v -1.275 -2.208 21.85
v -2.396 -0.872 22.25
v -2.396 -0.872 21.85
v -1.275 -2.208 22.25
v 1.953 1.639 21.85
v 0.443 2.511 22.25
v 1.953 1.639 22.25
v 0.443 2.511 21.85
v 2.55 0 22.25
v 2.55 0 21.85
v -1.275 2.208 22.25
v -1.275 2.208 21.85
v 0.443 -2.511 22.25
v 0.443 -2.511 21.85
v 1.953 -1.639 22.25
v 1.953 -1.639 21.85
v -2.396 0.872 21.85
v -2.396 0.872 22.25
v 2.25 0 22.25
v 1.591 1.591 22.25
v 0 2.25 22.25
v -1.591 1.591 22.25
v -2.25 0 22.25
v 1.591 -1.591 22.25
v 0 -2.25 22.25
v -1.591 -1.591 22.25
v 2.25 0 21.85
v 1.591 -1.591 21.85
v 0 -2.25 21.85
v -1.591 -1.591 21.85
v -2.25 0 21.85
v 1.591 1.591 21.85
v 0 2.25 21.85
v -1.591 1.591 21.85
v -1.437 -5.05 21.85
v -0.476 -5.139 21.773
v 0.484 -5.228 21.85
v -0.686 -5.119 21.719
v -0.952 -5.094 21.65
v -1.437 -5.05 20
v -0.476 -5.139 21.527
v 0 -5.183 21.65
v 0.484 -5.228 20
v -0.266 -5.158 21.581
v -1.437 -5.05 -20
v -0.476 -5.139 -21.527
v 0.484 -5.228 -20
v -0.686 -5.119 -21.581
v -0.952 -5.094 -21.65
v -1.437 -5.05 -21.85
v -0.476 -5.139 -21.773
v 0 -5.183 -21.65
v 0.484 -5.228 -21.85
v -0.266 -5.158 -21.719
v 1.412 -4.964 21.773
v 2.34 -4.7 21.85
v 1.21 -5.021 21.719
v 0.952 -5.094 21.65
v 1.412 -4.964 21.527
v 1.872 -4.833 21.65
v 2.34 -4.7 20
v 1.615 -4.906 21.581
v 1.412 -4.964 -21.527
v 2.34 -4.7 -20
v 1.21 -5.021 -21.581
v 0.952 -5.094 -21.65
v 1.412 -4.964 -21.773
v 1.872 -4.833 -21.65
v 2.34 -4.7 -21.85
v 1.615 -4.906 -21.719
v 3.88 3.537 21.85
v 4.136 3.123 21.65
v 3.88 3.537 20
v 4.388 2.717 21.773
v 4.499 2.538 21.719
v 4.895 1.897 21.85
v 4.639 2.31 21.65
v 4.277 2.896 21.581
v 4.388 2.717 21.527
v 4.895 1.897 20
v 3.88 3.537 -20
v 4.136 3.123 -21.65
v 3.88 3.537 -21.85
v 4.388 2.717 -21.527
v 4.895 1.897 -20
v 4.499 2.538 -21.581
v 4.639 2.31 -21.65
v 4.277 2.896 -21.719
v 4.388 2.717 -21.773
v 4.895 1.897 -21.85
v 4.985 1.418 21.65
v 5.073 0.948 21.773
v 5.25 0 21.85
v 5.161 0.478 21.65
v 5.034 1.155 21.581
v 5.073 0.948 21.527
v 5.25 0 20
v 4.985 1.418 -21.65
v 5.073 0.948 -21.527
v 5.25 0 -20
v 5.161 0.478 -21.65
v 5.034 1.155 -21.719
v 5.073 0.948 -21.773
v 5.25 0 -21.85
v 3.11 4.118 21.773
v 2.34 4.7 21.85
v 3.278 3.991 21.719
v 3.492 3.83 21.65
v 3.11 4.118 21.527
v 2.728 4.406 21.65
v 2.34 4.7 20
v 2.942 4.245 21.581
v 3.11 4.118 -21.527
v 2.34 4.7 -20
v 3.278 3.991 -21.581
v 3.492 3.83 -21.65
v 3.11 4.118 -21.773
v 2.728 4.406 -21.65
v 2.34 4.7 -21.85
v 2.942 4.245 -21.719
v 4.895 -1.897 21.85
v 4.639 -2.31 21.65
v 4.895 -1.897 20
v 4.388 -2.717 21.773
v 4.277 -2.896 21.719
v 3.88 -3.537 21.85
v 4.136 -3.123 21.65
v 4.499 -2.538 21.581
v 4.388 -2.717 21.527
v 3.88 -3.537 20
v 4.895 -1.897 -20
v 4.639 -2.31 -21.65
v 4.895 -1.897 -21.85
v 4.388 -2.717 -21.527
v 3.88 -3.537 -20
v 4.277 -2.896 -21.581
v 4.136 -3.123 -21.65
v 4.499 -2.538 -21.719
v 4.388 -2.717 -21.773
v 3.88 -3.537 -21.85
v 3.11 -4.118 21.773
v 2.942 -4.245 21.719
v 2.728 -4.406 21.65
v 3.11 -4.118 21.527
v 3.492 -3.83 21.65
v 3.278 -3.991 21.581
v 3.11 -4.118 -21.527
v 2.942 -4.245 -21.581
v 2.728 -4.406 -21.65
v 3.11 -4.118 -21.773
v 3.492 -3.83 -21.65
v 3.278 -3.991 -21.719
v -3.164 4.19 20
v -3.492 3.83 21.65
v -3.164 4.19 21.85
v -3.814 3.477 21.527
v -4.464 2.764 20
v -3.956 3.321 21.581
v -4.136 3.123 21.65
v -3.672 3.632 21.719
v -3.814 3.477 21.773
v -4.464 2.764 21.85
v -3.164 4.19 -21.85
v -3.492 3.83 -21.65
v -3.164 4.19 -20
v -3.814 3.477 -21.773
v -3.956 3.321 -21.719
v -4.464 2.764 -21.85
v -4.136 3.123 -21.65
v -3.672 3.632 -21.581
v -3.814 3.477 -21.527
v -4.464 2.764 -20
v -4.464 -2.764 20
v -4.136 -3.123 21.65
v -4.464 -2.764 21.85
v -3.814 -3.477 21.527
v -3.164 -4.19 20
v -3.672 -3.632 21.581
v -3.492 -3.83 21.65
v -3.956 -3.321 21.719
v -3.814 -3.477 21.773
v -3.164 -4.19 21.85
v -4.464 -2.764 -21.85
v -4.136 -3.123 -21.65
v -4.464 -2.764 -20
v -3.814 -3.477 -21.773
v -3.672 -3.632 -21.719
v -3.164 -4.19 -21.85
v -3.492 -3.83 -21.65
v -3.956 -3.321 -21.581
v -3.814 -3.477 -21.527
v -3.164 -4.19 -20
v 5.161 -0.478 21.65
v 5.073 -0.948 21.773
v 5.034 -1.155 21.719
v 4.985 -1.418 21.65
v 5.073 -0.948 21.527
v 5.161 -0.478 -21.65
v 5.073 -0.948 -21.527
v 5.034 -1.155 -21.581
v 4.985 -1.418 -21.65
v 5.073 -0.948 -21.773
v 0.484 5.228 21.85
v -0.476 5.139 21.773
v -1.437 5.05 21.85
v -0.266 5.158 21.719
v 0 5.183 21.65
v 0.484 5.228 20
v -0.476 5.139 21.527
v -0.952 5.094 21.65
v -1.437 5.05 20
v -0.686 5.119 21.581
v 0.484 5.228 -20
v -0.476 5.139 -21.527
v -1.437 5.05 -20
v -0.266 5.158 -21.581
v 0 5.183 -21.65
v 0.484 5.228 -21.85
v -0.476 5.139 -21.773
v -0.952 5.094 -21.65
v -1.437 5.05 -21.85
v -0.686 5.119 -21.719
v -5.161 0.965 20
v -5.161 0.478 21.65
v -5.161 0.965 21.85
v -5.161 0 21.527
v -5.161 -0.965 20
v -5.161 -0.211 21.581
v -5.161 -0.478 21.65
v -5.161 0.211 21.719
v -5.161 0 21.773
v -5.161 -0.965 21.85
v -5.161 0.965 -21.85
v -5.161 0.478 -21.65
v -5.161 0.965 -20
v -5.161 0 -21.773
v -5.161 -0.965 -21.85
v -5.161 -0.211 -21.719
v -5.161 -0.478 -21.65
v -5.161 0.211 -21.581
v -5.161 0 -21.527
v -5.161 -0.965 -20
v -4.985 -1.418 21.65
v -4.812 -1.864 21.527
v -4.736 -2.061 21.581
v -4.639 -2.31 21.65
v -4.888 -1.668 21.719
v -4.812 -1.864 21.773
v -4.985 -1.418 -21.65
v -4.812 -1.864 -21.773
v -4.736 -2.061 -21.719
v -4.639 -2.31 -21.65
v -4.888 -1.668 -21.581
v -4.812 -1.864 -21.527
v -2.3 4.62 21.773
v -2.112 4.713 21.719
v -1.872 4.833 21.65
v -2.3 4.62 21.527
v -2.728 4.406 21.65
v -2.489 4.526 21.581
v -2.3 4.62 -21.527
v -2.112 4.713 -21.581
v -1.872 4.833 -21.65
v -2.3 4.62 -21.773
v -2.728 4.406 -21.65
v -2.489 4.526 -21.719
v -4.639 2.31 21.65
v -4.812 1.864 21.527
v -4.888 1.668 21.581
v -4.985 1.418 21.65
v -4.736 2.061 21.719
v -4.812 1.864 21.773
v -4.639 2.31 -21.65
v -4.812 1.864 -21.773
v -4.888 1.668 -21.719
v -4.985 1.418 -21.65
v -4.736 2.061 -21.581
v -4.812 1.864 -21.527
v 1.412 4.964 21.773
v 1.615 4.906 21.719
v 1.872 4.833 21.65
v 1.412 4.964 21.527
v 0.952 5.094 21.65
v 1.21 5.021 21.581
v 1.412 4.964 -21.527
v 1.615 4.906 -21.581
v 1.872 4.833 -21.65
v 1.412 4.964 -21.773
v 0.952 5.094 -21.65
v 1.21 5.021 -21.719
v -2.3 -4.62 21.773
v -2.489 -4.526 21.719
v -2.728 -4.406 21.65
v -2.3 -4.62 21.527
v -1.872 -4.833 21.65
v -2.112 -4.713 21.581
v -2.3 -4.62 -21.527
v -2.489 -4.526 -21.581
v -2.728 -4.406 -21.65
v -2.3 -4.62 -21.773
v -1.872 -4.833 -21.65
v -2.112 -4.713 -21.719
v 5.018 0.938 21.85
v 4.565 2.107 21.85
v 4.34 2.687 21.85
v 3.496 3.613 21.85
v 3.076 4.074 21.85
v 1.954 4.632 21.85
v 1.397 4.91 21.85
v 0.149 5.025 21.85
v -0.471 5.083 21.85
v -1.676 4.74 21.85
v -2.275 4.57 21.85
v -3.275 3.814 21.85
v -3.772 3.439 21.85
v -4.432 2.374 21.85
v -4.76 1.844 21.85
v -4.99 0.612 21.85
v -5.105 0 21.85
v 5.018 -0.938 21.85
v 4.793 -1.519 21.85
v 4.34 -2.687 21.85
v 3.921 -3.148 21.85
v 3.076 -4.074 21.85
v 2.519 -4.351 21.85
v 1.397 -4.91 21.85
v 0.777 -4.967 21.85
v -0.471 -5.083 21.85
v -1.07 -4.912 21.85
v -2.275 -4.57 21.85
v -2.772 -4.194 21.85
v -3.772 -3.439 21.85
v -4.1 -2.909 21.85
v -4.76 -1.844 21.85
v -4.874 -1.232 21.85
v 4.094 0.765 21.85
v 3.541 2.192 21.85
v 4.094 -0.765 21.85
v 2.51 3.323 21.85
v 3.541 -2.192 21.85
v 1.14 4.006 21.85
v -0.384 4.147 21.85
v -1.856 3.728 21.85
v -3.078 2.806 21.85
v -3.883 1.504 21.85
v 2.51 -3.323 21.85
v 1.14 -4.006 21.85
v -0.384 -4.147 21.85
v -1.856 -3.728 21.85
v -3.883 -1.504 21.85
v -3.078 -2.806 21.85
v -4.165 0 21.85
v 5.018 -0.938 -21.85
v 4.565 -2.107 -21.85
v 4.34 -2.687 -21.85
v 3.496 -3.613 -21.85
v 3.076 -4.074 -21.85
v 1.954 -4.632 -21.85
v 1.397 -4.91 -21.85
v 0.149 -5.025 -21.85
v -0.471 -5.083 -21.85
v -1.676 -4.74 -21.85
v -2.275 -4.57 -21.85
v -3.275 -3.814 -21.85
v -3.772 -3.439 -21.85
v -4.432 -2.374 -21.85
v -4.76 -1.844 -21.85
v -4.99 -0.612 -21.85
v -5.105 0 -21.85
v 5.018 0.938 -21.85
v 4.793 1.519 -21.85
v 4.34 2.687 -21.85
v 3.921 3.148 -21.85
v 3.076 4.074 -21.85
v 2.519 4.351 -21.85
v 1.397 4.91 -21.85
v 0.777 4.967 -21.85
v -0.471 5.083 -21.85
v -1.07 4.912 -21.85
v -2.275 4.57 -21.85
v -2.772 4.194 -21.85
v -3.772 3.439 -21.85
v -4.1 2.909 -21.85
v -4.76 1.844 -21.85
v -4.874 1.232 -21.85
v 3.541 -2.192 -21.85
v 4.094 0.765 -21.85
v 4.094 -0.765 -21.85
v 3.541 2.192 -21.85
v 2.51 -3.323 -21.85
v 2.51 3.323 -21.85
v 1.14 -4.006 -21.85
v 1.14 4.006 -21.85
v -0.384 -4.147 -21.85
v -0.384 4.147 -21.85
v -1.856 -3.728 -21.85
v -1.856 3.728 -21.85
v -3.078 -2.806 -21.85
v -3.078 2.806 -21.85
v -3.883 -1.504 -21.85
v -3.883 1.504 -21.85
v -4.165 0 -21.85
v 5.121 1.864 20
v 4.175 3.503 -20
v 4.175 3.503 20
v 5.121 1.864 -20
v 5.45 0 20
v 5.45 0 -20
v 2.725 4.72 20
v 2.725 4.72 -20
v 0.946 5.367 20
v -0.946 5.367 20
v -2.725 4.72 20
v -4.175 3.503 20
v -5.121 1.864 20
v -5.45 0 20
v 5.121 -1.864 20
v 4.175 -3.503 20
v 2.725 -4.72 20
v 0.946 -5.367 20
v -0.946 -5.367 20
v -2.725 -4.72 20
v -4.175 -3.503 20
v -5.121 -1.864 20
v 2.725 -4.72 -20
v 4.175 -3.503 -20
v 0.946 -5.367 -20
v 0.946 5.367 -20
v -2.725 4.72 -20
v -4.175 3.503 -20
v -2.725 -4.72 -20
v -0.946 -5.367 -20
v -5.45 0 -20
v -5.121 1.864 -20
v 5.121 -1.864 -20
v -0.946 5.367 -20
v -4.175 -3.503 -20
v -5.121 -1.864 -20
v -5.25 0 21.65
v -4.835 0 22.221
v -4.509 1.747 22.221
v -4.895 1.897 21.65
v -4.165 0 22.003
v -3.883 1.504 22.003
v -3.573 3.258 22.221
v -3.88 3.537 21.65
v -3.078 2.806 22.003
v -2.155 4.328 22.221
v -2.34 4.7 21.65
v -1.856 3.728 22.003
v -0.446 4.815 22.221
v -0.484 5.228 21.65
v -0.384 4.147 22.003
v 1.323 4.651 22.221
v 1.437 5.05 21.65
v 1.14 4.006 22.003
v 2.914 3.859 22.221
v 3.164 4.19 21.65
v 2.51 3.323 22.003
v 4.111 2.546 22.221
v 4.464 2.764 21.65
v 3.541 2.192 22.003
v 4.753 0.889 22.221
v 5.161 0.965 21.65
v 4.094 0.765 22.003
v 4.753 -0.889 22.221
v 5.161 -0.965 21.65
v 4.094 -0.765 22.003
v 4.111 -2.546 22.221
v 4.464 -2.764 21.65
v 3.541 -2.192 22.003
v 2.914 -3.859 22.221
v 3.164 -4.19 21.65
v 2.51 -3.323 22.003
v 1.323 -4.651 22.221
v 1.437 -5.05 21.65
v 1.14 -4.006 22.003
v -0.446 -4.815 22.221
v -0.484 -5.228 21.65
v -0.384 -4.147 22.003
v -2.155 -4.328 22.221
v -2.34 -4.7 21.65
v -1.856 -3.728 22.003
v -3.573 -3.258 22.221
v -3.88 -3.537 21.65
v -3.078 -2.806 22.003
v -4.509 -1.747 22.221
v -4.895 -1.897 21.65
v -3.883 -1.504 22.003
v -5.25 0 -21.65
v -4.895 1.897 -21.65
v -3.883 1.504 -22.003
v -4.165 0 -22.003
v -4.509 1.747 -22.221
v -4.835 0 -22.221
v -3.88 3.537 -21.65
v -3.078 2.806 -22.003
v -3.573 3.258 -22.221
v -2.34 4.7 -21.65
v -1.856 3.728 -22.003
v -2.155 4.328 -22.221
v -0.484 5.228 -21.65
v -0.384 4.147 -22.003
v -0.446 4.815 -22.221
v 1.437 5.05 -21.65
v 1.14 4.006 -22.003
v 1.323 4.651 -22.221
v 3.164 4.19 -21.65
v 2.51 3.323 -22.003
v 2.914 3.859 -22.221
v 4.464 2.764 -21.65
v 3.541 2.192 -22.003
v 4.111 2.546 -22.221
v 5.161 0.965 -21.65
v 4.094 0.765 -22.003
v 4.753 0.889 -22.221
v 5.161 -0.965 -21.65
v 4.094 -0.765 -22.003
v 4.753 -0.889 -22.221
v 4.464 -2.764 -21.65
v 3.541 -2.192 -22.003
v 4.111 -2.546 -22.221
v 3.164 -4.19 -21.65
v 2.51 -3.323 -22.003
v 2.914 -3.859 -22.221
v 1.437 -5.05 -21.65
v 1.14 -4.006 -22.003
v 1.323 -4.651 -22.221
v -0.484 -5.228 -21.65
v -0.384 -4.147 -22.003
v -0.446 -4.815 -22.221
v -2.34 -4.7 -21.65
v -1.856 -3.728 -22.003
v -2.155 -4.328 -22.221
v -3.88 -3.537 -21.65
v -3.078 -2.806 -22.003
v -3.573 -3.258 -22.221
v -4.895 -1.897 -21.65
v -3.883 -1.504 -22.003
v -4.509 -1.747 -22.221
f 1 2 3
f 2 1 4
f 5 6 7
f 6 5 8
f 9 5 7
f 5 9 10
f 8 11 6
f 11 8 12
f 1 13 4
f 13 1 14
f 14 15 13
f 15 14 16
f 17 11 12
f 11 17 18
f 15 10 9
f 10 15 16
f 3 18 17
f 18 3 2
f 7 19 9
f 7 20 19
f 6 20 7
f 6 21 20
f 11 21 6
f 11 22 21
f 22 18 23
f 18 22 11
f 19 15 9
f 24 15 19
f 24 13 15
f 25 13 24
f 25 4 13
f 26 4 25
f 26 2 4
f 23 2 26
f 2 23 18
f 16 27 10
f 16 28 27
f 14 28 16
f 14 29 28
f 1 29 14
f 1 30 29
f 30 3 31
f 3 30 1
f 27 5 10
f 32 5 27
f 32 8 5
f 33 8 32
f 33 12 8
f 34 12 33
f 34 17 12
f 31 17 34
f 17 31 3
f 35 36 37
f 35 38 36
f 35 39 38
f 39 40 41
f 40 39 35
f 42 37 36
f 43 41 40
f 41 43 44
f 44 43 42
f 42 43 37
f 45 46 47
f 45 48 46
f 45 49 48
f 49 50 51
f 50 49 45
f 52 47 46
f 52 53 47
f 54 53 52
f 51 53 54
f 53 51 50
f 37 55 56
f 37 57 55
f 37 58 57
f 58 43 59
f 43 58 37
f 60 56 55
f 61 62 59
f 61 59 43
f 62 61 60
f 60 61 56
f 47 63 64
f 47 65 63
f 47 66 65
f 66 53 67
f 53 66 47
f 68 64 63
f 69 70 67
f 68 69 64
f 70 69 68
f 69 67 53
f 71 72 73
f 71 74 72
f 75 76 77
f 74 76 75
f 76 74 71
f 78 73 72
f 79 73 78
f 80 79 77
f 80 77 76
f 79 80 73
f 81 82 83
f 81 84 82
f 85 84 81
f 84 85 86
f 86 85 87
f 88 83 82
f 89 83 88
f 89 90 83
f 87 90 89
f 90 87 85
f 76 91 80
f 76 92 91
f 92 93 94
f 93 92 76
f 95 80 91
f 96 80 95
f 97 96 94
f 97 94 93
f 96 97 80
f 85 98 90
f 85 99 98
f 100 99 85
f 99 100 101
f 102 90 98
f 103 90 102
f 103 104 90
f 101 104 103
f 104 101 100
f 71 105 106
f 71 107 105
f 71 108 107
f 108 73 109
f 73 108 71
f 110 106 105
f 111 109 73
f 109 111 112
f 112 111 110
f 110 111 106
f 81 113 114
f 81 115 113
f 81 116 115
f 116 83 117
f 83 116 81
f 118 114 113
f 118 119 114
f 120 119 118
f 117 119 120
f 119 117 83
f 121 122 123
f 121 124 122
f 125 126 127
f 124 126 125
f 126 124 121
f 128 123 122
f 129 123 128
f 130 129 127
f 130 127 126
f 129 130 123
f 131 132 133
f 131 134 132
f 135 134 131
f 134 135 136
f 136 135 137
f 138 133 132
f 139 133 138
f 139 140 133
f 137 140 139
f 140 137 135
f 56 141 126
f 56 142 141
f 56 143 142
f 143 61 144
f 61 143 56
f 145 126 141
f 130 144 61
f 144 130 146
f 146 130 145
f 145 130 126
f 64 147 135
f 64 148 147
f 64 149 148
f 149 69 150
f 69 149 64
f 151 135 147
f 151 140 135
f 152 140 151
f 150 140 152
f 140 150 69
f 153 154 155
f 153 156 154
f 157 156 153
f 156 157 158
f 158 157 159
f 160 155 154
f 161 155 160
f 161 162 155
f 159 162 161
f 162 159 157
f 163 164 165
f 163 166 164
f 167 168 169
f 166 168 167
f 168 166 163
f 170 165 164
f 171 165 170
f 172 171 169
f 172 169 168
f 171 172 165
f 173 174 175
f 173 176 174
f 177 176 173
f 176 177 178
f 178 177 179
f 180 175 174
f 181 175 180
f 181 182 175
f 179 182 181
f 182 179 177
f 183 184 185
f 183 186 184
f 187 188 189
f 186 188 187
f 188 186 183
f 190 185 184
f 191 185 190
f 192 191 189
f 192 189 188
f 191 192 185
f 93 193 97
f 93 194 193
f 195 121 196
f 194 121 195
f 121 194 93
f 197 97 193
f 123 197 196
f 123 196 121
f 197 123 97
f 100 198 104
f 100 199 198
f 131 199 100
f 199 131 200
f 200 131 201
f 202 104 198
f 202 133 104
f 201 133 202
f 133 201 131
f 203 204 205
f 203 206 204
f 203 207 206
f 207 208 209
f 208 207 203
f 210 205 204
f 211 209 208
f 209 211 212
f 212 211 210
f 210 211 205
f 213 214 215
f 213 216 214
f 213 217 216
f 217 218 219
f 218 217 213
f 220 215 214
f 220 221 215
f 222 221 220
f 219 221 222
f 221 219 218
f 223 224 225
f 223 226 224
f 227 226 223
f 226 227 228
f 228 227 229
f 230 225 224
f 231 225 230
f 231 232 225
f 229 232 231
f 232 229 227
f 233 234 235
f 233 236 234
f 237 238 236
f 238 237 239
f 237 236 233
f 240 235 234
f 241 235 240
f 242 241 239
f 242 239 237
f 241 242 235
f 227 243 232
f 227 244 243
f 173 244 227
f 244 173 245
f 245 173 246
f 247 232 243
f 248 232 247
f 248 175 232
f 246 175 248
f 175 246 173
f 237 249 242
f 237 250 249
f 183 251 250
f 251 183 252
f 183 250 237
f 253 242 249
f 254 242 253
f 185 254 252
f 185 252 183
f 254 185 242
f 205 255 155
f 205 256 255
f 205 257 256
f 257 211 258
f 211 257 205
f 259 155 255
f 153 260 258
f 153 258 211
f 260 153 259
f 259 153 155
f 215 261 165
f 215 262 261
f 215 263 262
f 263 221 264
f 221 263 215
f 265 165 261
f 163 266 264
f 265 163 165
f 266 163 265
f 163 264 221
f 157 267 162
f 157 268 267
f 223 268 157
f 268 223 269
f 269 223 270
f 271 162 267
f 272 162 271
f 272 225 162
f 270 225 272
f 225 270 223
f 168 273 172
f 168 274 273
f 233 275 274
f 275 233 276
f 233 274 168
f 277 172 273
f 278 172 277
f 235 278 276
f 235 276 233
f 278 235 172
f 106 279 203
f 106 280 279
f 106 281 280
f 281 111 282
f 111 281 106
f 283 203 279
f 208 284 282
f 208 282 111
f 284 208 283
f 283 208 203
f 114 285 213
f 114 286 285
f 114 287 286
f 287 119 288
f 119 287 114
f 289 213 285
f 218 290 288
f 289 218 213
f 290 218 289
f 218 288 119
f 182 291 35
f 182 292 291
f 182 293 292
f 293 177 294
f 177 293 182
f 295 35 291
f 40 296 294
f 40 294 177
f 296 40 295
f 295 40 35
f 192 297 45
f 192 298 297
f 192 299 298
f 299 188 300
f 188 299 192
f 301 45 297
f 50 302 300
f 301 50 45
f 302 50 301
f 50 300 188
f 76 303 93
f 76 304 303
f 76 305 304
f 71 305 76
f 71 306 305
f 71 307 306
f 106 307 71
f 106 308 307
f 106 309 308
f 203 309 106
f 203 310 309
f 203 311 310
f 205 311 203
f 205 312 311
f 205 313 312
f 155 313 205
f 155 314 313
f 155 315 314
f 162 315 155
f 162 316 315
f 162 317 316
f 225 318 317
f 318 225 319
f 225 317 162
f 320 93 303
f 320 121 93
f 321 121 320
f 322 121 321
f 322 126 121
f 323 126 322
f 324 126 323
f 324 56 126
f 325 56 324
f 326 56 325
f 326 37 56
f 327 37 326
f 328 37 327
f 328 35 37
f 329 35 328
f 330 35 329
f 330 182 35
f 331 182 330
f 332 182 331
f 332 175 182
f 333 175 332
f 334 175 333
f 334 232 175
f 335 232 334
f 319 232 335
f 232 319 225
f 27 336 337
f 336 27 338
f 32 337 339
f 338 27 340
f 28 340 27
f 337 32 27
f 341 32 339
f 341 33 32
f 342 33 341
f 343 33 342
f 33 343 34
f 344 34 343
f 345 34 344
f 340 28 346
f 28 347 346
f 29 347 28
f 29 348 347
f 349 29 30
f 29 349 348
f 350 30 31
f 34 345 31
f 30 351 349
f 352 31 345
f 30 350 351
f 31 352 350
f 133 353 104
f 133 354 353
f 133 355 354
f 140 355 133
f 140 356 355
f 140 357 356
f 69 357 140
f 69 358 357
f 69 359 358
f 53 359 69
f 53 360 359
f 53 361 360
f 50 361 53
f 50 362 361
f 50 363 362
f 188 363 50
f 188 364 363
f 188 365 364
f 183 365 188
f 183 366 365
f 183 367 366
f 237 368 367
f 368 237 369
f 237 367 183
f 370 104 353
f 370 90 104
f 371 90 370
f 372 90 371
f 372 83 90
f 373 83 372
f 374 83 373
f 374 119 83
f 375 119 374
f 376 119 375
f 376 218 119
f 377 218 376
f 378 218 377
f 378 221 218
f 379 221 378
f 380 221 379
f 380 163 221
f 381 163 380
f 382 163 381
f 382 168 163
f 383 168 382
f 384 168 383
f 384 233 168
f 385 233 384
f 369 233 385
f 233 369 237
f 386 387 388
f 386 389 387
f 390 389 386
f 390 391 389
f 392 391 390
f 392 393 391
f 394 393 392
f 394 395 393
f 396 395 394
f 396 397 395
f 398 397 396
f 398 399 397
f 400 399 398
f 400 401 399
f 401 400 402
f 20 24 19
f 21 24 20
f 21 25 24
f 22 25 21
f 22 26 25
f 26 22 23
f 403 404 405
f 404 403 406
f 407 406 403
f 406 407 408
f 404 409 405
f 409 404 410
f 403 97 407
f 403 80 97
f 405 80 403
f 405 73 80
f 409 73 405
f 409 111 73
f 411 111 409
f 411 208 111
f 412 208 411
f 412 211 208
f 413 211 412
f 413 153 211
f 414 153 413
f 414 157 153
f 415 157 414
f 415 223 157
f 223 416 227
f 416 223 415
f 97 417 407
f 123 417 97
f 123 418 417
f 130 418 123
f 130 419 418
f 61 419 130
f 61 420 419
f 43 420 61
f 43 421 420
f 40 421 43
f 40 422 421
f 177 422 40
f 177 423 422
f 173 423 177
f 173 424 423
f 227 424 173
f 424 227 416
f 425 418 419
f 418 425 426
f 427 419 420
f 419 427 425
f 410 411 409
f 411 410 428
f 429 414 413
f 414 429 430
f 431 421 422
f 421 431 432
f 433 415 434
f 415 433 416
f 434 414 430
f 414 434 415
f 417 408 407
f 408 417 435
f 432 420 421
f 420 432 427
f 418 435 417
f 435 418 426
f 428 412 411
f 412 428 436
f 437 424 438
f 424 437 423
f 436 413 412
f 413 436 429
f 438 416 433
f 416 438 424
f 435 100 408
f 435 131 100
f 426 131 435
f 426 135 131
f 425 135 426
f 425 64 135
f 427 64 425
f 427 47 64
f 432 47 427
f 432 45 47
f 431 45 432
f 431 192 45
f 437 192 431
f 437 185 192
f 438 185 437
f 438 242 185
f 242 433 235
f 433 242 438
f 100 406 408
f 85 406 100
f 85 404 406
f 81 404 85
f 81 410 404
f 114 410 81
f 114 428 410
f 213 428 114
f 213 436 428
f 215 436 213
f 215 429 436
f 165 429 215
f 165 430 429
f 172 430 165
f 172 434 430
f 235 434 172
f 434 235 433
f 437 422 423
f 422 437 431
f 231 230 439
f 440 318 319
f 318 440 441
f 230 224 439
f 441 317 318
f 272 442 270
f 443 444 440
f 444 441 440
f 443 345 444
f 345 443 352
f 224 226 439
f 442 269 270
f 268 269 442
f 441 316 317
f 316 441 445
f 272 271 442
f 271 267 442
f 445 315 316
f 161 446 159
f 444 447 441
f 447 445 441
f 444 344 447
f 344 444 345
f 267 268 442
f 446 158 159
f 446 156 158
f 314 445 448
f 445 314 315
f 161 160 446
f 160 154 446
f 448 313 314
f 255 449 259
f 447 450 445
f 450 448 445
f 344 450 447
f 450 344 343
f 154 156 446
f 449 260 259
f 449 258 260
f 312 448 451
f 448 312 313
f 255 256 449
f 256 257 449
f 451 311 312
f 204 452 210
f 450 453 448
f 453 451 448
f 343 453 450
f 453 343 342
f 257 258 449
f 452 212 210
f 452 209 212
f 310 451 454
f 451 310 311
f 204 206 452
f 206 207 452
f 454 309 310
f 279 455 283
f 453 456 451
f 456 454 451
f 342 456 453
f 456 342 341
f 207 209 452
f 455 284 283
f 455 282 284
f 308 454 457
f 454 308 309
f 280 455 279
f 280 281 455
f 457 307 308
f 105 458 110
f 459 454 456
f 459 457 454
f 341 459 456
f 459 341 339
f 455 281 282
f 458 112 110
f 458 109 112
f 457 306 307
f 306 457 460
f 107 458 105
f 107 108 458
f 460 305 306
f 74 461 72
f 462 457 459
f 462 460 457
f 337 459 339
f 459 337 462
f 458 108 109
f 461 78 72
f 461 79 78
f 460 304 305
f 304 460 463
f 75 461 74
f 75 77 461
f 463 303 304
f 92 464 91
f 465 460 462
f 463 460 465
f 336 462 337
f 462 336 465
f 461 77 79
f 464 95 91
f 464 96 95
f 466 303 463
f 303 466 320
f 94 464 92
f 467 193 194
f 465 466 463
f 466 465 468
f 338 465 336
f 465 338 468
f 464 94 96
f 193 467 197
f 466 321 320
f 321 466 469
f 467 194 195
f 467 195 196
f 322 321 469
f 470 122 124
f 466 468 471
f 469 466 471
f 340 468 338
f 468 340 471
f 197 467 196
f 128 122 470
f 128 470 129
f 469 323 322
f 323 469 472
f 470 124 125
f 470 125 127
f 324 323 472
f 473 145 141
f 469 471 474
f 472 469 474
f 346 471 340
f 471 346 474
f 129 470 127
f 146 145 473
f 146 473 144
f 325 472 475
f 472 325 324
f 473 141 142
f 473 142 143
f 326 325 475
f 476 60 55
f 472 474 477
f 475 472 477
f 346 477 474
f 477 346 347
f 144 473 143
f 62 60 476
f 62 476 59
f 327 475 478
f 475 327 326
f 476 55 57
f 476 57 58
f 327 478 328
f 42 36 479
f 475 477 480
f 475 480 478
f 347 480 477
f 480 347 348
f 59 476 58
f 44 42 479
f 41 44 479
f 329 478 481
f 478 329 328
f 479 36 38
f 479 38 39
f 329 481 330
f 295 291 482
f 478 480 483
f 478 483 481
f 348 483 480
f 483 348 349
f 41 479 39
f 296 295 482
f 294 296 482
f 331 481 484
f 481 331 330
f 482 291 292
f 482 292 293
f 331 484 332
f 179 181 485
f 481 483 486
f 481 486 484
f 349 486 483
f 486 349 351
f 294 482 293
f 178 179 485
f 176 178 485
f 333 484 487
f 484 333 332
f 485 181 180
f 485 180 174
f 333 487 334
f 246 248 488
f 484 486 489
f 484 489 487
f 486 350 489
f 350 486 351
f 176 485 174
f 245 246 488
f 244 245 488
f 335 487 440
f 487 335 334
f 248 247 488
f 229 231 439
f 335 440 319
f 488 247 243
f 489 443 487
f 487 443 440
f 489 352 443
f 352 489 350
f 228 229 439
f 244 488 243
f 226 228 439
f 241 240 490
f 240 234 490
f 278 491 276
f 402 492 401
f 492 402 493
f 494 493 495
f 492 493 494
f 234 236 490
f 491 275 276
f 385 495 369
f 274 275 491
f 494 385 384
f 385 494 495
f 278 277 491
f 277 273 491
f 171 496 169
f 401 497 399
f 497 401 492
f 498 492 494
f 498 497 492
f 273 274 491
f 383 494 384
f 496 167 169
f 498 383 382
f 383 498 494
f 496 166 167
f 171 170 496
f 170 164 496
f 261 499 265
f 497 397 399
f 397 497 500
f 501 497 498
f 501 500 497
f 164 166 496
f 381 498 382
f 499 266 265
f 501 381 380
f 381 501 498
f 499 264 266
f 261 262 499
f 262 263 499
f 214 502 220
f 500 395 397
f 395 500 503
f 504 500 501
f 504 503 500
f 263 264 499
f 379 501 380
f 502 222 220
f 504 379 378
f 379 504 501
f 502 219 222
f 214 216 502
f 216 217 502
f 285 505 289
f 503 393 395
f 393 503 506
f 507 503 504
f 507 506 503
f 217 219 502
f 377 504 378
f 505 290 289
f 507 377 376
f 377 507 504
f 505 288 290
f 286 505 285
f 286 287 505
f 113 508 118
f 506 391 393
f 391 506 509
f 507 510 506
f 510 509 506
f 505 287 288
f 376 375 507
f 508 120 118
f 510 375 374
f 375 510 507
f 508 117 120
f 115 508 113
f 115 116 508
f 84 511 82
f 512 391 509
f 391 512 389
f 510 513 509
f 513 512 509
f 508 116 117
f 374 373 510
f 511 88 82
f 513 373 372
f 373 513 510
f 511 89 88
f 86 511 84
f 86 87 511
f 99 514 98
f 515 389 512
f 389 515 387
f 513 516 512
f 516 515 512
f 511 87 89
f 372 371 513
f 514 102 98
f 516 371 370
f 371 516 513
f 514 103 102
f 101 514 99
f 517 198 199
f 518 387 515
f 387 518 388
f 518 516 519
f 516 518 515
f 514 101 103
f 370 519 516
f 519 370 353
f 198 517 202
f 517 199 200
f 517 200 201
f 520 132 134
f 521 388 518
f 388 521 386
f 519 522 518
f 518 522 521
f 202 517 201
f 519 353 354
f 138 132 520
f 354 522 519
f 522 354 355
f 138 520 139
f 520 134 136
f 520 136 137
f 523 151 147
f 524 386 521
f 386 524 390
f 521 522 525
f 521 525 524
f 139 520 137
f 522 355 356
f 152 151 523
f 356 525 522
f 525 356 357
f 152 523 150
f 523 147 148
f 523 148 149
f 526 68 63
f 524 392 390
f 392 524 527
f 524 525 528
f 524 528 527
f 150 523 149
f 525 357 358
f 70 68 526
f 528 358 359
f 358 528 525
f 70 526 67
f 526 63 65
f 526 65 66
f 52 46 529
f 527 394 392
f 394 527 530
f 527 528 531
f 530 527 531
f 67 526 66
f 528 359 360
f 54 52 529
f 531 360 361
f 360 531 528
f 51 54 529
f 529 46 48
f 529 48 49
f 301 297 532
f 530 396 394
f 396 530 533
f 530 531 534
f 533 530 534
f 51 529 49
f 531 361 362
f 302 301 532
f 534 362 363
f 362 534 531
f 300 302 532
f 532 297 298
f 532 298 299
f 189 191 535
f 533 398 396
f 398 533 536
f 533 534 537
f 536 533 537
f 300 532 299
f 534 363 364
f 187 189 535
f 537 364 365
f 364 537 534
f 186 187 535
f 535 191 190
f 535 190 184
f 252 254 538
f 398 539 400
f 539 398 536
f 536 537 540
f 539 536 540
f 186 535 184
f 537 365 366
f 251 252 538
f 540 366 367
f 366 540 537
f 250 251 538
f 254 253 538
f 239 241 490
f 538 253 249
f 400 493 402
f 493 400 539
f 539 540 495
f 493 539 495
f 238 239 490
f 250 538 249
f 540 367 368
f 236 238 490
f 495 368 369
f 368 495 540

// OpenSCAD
// Parameters
cell_height = 44.5; //[22.25:89:0.1]
cell_diameter = 10.5; //[5.25:21:0.1]
cap_height = 0.8; //[0.4:1.6:0.05]
cap_diameter = 10.5; //[5.25:21:0.1]
button_height = 1.2; //[0.6:2.4:0.05]
button_diameter = 4.5; //[2.25:9:0.1]
insulator_thickness = 0.3; //[0.15:0.6:0.05]
insulator_height = 0.4; //[0.2:0.8:0.05]
label_thickness = 0.2; //[0.1:0.4:0.05]
label_height = 40; //[20:80:0.5]
fillet_radius = 0.6; //[0.3:1.2:0.05]
overlap = 0.8; //[0.5:2:0.1]

// Base Shapes
module cell_body() {
  color("DimGray")
  cylinder(h = cell_height - 2 * cap_height, r = cell_diameter / 2, center = true);
}

module top_cap() {
  color("Silver")
  translate([0, 0, (cell_height - cap_height) / 2 - overlap / 2])
  cylinder(h = cap_height, r = cap_diameter / 2, center = true);
}

module bottom_cap() {
  color("Silver")
  translate([0, 0, -(cell_height - cap_height) / 2 + overlap / 2])
  cylinder(h = cap_height, r = cap_diameter / 2, center = true);
}

module positive_terminal_button() {
  color("Gold")
  translate([0, 0, cell_height / 2 - cap_height - button_height / 2 + overlap])
  cylinder(h = button_height, r = button_diameter / 2, center = true);
}

module insulator_outer() {
  cylinder(h = insulator_height, r = button_diameter / 2 + insulator_thickness, center = true);
}

module insulator_inner_cut() {
  cylinder(h = insulator_height + 2 * overlap, r = button_diameter / 2, center = true);
}

module insulator_ring() {
  color("Black")
  translate([0, 0, cell_height / 2 - cap_height - insulator_height / 2 + overlap])
  difference() {
    insulator_outer();
    insulator_inner_cut();
  }
}

module label_wrap() {
  color("Blue")
  cylinder(h = label_height, r = cell_diameter / 2 + label_thickness, center = true);
}

module edge_fillet_top() {
  color("Silver")
  translate([0, 0, cell_height / 2 - fillet_radius])
  rotate_extrude() translate([cell_diameter / 2 - fillet_radius, 0, 0]) circle(r = fillet_radius);
}

module edge_fillet_bottom() {
  color("Silver")
  translate([0, 0, -cell_height / 2 + fillet_radius])
  rotate_extrude() translate([cell_diameter / 2 - fillet_radius, 0, 0]) circle(r = fillet_radius);
}

// Final Assembly
module main_cell_union() {
  union() {
    cell_body();
    top_cap();
    bottom_cap();
    positive_terminal_button();
    insulator_ring();
    label_wrap();
    edge_fillet_top();
    edge_fillet_bottom();
  }
}

// Render the final output
main_cell_union();
